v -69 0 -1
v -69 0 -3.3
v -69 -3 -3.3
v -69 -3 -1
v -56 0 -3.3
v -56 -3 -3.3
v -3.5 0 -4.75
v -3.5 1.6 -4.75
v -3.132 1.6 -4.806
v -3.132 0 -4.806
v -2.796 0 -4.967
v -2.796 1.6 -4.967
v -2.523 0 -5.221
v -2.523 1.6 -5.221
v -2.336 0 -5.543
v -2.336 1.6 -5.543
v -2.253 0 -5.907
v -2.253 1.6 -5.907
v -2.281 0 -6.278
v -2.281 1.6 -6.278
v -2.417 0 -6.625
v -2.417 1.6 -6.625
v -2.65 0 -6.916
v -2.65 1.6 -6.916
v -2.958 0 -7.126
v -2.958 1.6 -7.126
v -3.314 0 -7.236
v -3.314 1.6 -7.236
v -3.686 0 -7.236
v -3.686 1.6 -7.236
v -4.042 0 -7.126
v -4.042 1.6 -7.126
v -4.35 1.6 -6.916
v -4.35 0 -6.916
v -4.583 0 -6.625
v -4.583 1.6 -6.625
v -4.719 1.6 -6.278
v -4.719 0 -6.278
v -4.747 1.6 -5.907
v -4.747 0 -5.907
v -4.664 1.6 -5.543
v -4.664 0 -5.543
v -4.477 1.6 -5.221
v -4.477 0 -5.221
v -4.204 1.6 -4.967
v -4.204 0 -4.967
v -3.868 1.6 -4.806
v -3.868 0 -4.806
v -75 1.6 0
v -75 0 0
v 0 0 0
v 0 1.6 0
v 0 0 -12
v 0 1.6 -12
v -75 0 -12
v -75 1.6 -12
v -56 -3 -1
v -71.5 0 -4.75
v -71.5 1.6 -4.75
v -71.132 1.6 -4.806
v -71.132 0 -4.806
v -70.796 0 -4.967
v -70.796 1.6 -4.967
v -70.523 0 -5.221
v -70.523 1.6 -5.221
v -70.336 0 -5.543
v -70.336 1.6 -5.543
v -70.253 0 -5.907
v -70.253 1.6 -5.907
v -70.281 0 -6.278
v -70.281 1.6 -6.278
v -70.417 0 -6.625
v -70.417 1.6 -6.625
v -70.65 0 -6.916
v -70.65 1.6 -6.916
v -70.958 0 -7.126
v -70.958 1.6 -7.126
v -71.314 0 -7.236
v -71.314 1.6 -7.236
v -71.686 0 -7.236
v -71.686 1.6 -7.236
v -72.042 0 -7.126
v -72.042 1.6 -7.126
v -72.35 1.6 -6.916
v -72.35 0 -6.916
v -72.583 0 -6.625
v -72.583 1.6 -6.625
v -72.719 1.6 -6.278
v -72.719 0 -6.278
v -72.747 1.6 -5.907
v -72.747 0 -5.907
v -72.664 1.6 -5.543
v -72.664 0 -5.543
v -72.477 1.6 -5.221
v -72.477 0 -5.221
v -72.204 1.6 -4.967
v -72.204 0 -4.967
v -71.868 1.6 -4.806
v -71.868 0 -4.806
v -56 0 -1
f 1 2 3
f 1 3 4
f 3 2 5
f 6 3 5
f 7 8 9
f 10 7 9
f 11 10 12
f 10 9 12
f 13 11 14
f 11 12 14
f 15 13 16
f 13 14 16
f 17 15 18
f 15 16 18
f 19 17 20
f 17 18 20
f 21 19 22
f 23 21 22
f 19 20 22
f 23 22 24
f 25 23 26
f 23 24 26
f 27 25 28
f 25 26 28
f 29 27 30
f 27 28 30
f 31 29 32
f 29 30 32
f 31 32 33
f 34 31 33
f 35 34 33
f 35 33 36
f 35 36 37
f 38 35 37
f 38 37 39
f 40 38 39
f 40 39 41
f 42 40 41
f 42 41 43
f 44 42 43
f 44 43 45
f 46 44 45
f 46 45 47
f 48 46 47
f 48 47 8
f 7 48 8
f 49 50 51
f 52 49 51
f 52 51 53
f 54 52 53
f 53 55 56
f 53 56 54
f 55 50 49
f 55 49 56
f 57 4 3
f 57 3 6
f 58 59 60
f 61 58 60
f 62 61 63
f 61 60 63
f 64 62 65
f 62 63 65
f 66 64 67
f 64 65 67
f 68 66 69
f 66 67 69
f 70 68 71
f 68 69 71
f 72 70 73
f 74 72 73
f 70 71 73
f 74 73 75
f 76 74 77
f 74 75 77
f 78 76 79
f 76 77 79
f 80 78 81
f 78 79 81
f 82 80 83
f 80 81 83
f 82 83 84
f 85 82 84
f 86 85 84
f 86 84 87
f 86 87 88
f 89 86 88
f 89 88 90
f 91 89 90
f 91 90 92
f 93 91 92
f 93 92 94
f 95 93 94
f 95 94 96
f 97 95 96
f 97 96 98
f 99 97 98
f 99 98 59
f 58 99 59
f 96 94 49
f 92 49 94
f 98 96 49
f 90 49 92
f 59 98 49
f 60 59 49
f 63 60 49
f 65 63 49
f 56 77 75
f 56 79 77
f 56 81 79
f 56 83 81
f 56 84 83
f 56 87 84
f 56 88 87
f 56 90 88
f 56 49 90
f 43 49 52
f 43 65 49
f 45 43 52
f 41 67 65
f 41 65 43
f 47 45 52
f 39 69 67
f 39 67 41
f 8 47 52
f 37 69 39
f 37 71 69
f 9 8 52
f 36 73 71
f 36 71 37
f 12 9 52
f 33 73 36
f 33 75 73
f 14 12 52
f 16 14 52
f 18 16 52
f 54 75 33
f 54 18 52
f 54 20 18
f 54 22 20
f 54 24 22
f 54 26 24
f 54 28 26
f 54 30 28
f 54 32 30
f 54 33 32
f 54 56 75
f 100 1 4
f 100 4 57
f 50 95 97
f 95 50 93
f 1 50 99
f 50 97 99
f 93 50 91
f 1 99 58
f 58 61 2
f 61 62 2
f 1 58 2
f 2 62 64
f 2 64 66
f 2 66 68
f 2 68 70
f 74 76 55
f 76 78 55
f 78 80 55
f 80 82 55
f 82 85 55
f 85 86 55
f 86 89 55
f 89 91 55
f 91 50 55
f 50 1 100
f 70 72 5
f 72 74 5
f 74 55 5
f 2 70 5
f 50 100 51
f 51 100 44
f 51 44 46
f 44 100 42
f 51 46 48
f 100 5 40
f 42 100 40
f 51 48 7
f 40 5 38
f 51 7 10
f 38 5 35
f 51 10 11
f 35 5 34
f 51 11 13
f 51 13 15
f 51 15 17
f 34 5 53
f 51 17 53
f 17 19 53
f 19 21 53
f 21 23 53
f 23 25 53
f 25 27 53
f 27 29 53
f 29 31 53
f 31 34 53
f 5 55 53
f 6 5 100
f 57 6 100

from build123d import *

# Parameters (mm, degrees)
SKETCH1_W           = 75
SKETCH1_H           = 12
PCB_DEPTH           = 1.6
SKETCH2_R           = 1.25
SCREW_HOLES_DEPTH   = 76.970783858
SKETCH3_W           = 13
SKETCH3_H           = 2.3
BOSS_EXTRUDE1_DEPTH = 3


with BuildPart() as part:
    # Sketch1 → pcb (new body)
    with BuildSketch(Plane(origin=(0, 0, 0), x_dir=(1, 0, 0), z_dir=(0, 1, 0))):
        with Locations((-37.5, 6)):
            Rectangle(SKETCH1_W, SKETCH1_H)
    extrude(amount=PCB_DEPTH)

    # Sketch2 → screw holes (cut, through all)
    with BuildSketch(Plane(origin=(0, 1.6, 0), x_dir=(1, 0, 0), z_dir=(0, 1, 0))):
        with Locations(Location((-71.5, 6, 0), (0, 0, 270))):
            Circle(SKETCH2_R)
        with Locations(Location((-3.5, 6, 0), (0, 0, 270))):
            Circle(SKETCH2_R)
    extrude(amount=-SCREW_HOLES_DEPTH, mode=Mode.SUBTRACT)

    # Sketch3 → Boss-Extrude1 (add)
    with BuildSketch(Plane.XZ):
        with Locations((-62.5, -2.15)):
            Rectangle(SKETCH3_W, SKETCH3_H)
    extrude(amount=BOSS_EXTRUDE1_DEPTH)


solid = part.part
